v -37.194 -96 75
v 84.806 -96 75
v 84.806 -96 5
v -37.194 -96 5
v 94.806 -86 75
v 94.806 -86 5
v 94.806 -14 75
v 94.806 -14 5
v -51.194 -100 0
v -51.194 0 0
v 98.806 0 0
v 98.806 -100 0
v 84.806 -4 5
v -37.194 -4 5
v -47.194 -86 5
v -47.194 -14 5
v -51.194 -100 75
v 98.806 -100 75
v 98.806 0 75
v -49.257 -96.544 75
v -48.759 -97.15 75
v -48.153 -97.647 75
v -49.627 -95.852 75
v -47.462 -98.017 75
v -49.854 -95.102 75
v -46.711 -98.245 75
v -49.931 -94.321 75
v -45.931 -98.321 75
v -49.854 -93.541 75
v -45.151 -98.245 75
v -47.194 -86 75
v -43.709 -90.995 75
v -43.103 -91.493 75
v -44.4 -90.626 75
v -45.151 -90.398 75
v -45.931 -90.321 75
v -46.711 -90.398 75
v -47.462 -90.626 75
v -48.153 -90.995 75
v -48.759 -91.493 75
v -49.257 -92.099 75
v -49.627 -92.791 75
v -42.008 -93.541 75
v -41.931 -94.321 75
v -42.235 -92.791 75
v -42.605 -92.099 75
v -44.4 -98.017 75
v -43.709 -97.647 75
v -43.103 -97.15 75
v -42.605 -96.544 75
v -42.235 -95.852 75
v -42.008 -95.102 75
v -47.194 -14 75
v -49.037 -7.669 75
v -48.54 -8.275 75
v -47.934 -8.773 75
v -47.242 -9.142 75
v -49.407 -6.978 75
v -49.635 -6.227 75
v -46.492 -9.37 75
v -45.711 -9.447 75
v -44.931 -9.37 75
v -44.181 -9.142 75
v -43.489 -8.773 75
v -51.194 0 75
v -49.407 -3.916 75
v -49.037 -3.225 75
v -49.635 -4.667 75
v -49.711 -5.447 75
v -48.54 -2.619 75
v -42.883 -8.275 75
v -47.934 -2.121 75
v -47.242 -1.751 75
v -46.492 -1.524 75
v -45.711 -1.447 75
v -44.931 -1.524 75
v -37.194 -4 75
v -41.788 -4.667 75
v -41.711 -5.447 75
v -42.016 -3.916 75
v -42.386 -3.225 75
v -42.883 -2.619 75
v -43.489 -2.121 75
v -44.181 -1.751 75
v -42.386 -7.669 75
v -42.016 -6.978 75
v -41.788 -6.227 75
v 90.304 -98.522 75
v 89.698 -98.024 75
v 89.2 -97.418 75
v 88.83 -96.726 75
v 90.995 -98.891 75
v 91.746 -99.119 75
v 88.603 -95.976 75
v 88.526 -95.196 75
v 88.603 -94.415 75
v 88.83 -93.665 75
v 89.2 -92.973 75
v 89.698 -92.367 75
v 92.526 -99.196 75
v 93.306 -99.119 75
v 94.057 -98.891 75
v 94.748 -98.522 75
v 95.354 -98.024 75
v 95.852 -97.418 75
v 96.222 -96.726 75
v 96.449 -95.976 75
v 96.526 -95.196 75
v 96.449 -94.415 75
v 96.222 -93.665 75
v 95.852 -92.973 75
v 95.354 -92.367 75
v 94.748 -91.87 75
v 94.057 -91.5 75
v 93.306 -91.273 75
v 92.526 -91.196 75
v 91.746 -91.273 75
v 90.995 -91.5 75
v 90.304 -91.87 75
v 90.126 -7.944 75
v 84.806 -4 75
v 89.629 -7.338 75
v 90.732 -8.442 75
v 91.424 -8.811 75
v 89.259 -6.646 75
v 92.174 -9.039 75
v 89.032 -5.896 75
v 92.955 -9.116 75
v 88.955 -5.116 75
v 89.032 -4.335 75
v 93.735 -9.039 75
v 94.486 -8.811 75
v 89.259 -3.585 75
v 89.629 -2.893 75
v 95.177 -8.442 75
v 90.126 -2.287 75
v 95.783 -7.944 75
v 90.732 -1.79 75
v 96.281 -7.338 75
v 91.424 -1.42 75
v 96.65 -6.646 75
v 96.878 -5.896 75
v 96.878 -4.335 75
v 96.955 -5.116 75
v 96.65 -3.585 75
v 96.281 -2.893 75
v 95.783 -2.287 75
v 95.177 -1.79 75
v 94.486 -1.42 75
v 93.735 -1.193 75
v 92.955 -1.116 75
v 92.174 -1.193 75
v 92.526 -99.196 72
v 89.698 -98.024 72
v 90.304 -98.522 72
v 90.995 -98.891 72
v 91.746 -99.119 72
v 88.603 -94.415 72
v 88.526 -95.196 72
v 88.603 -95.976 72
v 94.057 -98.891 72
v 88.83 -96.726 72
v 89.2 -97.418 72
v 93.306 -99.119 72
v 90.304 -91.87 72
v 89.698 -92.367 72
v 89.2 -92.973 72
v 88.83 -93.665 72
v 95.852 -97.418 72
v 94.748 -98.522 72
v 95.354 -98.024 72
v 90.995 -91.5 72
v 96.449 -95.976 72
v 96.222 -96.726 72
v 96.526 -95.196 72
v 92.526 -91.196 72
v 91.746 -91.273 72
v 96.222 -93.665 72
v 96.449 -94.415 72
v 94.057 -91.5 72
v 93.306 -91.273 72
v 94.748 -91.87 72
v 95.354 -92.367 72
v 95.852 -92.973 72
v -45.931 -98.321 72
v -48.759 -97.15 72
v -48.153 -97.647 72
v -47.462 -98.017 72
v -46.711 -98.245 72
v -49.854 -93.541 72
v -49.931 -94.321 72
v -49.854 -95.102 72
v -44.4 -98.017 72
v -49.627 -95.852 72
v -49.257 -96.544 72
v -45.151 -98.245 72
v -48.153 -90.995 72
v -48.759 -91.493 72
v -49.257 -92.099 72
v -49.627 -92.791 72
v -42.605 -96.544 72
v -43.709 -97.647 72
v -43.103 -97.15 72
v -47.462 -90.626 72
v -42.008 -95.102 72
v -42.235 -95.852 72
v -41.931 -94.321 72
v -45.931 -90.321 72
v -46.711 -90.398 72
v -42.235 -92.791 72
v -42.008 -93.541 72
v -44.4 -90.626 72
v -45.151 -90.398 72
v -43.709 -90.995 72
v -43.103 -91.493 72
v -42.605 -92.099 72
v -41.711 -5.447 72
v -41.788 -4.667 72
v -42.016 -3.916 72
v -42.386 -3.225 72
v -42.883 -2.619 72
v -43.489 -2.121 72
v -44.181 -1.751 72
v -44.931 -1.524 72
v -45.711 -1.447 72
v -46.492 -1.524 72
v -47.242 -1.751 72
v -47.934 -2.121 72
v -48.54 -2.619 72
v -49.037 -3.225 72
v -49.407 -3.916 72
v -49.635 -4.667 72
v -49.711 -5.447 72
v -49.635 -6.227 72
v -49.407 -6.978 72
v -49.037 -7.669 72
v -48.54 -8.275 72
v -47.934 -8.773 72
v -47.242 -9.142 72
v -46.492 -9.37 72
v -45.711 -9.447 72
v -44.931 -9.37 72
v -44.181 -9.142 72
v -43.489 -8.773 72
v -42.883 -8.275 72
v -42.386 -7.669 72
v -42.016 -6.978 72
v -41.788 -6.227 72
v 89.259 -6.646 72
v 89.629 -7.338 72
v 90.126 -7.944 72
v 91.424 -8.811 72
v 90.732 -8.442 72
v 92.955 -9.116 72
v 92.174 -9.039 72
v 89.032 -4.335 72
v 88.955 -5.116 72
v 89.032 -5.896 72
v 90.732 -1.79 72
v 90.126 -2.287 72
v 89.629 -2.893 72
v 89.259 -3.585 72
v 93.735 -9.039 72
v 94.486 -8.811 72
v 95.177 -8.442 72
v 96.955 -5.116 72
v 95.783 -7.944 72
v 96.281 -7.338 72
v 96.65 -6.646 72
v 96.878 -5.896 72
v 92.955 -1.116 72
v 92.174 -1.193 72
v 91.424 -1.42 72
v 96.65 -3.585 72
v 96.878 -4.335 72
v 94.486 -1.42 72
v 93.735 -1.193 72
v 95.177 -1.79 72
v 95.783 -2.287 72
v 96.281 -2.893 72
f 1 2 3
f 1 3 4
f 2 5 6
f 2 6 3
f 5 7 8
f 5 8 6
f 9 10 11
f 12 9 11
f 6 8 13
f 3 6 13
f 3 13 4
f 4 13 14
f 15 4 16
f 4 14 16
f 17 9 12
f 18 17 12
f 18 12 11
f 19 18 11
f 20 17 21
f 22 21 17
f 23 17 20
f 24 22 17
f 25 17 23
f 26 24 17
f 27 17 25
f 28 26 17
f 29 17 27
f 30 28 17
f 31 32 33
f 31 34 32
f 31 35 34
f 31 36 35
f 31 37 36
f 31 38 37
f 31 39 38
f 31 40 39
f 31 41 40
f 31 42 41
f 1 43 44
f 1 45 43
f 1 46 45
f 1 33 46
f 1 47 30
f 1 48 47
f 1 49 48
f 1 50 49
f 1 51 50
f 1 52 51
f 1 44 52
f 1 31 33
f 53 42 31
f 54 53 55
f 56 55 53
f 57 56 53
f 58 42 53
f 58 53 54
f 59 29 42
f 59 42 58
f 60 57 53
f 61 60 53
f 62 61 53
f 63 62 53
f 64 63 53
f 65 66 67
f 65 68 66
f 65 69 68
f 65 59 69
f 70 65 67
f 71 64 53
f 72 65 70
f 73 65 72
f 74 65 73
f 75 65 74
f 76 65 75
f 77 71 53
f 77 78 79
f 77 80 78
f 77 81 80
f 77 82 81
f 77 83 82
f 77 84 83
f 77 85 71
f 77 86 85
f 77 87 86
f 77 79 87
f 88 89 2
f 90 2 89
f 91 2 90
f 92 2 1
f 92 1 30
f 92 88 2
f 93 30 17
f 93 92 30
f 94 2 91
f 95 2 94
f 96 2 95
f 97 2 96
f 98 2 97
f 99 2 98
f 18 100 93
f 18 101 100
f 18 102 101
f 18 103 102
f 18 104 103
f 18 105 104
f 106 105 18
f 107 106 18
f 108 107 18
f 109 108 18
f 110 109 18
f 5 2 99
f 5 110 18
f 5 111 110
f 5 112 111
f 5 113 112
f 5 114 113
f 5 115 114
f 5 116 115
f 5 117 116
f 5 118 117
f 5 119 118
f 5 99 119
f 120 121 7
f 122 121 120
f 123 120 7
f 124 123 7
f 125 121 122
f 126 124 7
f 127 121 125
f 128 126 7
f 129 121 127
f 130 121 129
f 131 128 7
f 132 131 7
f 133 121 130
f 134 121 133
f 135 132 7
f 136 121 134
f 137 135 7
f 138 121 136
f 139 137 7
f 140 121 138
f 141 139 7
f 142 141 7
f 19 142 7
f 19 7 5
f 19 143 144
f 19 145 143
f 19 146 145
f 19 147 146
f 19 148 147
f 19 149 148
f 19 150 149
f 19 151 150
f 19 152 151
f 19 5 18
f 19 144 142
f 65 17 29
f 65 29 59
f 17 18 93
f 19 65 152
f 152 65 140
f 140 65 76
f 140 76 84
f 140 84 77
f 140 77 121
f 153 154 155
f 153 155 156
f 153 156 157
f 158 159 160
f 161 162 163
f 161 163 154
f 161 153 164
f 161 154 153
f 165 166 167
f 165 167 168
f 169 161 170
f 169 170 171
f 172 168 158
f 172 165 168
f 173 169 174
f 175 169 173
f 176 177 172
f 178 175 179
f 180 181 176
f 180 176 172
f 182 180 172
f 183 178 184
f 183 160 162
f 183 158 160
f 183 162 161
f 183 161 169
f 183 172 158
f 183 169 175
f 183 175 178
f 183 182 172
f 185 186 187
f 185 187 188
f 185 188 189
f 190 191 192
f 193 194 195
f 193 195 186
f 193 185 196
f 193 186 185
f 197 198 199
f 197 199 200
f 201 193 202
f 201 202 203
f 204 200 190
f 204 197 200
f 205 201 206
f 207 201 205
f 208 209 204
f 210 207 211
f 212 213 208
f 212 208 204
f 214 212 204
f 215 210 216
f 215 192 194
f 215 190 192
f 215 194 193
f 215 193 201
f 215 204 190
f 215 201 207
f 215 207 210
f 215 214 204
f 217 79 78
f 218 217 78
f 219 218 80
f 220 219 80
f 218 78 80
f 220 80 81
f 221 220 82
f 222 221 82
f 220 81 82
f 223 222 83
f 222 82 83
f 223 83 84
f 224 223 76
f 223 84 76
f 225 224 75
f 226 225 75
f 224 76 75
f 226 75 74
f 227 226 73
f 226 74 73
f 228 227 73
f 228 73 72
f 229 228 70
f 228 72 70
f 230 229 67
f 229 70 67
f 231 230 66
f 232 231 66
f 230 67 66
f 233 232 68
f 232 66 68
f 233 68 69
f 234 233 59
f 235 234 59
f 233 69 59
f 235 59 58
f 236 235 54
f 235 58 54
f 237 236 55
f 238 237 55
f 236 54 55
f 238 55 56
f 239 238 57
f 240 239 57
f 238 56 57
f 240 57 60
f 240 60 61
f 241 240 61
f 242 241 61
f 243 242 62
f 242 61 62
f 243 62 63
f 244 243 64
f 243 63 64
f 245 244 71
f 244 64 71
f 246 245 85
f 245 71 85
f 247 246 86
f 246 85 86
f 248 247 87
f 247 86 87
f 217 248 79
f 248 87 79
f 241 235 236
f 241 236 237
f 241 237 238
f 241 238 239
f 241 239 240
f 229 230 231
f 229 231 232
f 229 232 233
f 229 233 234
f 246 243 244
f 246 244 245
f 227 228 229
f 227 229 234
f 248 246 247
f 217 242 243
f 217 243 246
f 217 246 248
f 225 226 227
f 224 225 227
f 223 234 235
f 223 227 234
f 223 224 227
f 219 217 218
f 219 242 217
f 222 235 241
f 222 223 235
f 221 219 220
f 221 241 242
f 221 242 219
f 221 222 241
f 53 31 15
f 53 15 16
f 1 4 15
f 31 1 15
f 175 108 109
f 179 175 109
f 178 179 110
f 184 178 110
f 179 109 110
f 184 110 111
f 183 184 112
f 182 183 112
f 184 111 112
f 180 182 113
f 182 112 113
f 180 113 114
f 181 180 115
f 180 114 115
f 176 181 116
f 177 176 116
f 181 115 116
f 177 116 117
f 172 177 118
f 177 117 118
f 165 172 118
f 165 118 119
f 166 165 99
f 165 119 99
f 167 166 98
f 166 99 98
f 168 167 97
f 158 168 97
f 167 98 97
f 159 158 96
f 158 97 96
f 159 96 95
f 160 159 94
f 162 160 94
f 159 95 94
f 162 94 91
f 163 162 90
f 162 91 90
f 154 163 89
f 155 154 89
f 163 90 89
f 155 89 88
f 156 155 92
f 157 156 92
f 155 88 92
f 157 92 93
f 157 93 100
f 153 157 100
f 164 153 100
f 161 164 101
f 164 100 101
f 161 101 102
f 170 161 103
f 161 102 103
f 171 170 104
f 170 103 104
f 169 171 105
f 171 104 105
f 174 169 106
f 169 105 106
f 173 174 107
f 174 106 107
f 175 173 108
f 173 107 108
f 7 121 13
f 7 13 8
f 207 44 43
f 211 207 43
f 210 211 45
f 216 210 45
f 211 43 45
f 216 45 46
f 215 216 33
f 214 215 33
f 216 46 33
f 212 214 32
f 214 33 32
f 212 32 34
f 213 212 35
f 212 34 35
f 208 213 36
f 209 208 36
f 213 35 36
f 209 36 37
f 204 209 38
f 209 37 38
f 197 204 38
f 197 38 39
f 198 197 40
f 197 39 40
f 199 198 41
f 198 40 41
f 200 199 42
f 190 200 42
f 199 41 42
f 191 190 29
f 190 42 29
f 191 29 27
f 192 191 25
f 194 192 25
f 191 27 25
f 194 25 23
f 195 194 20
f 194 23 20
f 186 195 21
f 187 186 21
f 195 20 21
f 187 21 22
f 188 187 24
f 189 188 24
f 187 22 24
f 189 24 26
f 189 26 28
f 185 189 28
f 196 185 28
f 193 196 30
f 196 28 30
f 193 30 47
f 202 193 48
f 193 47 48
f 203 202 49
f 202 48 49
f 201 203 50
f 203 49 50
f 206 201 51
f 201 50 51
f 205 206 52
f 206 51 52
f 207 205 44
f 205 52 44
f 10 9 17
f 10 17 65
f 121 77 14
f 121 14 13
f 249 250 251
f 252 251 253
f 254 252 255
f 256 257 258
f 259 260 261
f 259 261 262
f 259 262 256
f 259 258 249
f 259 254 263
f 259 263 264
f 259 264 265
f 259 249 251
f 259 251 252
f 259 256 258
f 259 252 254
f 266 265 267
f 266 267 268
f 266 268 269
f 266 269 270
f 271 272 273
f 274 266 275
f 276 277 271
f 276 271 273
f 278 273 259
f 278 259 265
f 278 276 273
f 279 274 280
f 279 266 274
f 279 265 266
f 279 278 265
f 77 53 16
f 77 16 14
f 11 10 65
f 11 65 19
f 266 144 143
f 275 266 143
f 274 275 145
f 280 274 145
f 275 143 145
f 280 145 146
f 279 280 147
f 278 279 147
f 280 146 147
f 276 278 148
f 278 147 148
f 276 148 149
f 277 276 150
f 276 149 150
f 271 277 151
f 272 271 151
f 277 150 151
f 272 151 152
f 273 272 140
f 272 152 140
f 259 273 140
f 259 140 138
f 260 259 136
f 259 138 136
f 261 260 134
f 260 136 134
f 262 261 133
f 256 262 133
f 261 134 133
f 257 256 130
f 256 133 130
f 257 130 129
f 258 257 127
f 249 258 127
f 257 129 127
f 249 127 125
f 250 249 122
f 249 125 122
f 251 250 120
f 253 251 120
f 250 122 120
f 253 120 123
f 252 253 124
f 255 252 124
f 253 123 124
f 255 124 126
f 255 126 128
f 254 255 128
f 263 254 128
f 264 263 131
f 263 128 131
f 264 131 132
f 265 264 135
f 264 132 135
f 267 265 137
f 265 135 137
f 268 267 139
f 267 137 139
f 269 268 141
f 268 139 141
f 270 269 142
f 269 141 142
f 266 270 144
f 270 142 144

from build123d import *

# Parameters (mm, degrees)
ESQUISSE1_W             = 150
ESQUISSE1_H             = 100
BOSS_EXTRU_1_DEPTH      = 75
ENL_V_MAT_EXTRU_2_DEPTH = 70
ESQUISSE5_R             = 4
ENL_V_MAT_EXTRU_3_DEPTH = 3
ESQUISSE6_R             = 4
ENL_V_MAT_EXTRU_4_DEPTH = 3


with BuildPart() as part:
    # Esquisse1 → Boss.-Extru.1 (new body)
    with BuildSketch(Plane.XY):
        with Locations((23.806447762, -50)):
            Rectangle(ESQUISSE1_W, ESQUISSE1_H)
    extrude(amount=BOSS_EXTRU_1_DEPTH)

    # Esquisse2 → Enlèv. mat.-Extru.2 (cut)
    with BuildSketch(Plane.XY.offset(75)):
        Polygon((-37.193552238, -4), (84.806447762, -4), (94.806447762, -14), (94.806447762, -86), (84.806447762, -96), (-37.193552238, -96), (-47.193552238, -86), (-47.193552238, -14), align=None)
    extrude(amount=-ENL_V_MAT_EXTRU_2_DEPTH, mode=Mode.SUBTRACT)

    # Esquisse5 → Enlèv. mat.-Extru.3 (cut)
    with BuildSketch(Plane.XY.offset(75)):
        with Locations((-45.7114952, -5.446962242)):
            Circle(ESQUISSE5_R)
    extrude(amount=-ENL_V_MAT_EXTRU_3_DEPTH, mode=Mode.SUBTRACT)

    # Esquisse6 → Enlèv. mat.-Extru.4 (cut)
    with BuildSketch(Plane.XY.offset(75)):
        with Locations((92.954779507, -5.115671586)):
            Circle(ESQUISSE6_R)
        with Locations((92.526014057, -95.195707231)):
            Circle(ESQUISSE6_R)
        with Locations((-45.931001662, -94.321365955)):
            Circle(ESQUISSE6_R)
    extrude(amount=-ENL_V_MAT_EXTRU_4_DEPTH, mode=Mode.SUBTRACT)


solid = part.part
